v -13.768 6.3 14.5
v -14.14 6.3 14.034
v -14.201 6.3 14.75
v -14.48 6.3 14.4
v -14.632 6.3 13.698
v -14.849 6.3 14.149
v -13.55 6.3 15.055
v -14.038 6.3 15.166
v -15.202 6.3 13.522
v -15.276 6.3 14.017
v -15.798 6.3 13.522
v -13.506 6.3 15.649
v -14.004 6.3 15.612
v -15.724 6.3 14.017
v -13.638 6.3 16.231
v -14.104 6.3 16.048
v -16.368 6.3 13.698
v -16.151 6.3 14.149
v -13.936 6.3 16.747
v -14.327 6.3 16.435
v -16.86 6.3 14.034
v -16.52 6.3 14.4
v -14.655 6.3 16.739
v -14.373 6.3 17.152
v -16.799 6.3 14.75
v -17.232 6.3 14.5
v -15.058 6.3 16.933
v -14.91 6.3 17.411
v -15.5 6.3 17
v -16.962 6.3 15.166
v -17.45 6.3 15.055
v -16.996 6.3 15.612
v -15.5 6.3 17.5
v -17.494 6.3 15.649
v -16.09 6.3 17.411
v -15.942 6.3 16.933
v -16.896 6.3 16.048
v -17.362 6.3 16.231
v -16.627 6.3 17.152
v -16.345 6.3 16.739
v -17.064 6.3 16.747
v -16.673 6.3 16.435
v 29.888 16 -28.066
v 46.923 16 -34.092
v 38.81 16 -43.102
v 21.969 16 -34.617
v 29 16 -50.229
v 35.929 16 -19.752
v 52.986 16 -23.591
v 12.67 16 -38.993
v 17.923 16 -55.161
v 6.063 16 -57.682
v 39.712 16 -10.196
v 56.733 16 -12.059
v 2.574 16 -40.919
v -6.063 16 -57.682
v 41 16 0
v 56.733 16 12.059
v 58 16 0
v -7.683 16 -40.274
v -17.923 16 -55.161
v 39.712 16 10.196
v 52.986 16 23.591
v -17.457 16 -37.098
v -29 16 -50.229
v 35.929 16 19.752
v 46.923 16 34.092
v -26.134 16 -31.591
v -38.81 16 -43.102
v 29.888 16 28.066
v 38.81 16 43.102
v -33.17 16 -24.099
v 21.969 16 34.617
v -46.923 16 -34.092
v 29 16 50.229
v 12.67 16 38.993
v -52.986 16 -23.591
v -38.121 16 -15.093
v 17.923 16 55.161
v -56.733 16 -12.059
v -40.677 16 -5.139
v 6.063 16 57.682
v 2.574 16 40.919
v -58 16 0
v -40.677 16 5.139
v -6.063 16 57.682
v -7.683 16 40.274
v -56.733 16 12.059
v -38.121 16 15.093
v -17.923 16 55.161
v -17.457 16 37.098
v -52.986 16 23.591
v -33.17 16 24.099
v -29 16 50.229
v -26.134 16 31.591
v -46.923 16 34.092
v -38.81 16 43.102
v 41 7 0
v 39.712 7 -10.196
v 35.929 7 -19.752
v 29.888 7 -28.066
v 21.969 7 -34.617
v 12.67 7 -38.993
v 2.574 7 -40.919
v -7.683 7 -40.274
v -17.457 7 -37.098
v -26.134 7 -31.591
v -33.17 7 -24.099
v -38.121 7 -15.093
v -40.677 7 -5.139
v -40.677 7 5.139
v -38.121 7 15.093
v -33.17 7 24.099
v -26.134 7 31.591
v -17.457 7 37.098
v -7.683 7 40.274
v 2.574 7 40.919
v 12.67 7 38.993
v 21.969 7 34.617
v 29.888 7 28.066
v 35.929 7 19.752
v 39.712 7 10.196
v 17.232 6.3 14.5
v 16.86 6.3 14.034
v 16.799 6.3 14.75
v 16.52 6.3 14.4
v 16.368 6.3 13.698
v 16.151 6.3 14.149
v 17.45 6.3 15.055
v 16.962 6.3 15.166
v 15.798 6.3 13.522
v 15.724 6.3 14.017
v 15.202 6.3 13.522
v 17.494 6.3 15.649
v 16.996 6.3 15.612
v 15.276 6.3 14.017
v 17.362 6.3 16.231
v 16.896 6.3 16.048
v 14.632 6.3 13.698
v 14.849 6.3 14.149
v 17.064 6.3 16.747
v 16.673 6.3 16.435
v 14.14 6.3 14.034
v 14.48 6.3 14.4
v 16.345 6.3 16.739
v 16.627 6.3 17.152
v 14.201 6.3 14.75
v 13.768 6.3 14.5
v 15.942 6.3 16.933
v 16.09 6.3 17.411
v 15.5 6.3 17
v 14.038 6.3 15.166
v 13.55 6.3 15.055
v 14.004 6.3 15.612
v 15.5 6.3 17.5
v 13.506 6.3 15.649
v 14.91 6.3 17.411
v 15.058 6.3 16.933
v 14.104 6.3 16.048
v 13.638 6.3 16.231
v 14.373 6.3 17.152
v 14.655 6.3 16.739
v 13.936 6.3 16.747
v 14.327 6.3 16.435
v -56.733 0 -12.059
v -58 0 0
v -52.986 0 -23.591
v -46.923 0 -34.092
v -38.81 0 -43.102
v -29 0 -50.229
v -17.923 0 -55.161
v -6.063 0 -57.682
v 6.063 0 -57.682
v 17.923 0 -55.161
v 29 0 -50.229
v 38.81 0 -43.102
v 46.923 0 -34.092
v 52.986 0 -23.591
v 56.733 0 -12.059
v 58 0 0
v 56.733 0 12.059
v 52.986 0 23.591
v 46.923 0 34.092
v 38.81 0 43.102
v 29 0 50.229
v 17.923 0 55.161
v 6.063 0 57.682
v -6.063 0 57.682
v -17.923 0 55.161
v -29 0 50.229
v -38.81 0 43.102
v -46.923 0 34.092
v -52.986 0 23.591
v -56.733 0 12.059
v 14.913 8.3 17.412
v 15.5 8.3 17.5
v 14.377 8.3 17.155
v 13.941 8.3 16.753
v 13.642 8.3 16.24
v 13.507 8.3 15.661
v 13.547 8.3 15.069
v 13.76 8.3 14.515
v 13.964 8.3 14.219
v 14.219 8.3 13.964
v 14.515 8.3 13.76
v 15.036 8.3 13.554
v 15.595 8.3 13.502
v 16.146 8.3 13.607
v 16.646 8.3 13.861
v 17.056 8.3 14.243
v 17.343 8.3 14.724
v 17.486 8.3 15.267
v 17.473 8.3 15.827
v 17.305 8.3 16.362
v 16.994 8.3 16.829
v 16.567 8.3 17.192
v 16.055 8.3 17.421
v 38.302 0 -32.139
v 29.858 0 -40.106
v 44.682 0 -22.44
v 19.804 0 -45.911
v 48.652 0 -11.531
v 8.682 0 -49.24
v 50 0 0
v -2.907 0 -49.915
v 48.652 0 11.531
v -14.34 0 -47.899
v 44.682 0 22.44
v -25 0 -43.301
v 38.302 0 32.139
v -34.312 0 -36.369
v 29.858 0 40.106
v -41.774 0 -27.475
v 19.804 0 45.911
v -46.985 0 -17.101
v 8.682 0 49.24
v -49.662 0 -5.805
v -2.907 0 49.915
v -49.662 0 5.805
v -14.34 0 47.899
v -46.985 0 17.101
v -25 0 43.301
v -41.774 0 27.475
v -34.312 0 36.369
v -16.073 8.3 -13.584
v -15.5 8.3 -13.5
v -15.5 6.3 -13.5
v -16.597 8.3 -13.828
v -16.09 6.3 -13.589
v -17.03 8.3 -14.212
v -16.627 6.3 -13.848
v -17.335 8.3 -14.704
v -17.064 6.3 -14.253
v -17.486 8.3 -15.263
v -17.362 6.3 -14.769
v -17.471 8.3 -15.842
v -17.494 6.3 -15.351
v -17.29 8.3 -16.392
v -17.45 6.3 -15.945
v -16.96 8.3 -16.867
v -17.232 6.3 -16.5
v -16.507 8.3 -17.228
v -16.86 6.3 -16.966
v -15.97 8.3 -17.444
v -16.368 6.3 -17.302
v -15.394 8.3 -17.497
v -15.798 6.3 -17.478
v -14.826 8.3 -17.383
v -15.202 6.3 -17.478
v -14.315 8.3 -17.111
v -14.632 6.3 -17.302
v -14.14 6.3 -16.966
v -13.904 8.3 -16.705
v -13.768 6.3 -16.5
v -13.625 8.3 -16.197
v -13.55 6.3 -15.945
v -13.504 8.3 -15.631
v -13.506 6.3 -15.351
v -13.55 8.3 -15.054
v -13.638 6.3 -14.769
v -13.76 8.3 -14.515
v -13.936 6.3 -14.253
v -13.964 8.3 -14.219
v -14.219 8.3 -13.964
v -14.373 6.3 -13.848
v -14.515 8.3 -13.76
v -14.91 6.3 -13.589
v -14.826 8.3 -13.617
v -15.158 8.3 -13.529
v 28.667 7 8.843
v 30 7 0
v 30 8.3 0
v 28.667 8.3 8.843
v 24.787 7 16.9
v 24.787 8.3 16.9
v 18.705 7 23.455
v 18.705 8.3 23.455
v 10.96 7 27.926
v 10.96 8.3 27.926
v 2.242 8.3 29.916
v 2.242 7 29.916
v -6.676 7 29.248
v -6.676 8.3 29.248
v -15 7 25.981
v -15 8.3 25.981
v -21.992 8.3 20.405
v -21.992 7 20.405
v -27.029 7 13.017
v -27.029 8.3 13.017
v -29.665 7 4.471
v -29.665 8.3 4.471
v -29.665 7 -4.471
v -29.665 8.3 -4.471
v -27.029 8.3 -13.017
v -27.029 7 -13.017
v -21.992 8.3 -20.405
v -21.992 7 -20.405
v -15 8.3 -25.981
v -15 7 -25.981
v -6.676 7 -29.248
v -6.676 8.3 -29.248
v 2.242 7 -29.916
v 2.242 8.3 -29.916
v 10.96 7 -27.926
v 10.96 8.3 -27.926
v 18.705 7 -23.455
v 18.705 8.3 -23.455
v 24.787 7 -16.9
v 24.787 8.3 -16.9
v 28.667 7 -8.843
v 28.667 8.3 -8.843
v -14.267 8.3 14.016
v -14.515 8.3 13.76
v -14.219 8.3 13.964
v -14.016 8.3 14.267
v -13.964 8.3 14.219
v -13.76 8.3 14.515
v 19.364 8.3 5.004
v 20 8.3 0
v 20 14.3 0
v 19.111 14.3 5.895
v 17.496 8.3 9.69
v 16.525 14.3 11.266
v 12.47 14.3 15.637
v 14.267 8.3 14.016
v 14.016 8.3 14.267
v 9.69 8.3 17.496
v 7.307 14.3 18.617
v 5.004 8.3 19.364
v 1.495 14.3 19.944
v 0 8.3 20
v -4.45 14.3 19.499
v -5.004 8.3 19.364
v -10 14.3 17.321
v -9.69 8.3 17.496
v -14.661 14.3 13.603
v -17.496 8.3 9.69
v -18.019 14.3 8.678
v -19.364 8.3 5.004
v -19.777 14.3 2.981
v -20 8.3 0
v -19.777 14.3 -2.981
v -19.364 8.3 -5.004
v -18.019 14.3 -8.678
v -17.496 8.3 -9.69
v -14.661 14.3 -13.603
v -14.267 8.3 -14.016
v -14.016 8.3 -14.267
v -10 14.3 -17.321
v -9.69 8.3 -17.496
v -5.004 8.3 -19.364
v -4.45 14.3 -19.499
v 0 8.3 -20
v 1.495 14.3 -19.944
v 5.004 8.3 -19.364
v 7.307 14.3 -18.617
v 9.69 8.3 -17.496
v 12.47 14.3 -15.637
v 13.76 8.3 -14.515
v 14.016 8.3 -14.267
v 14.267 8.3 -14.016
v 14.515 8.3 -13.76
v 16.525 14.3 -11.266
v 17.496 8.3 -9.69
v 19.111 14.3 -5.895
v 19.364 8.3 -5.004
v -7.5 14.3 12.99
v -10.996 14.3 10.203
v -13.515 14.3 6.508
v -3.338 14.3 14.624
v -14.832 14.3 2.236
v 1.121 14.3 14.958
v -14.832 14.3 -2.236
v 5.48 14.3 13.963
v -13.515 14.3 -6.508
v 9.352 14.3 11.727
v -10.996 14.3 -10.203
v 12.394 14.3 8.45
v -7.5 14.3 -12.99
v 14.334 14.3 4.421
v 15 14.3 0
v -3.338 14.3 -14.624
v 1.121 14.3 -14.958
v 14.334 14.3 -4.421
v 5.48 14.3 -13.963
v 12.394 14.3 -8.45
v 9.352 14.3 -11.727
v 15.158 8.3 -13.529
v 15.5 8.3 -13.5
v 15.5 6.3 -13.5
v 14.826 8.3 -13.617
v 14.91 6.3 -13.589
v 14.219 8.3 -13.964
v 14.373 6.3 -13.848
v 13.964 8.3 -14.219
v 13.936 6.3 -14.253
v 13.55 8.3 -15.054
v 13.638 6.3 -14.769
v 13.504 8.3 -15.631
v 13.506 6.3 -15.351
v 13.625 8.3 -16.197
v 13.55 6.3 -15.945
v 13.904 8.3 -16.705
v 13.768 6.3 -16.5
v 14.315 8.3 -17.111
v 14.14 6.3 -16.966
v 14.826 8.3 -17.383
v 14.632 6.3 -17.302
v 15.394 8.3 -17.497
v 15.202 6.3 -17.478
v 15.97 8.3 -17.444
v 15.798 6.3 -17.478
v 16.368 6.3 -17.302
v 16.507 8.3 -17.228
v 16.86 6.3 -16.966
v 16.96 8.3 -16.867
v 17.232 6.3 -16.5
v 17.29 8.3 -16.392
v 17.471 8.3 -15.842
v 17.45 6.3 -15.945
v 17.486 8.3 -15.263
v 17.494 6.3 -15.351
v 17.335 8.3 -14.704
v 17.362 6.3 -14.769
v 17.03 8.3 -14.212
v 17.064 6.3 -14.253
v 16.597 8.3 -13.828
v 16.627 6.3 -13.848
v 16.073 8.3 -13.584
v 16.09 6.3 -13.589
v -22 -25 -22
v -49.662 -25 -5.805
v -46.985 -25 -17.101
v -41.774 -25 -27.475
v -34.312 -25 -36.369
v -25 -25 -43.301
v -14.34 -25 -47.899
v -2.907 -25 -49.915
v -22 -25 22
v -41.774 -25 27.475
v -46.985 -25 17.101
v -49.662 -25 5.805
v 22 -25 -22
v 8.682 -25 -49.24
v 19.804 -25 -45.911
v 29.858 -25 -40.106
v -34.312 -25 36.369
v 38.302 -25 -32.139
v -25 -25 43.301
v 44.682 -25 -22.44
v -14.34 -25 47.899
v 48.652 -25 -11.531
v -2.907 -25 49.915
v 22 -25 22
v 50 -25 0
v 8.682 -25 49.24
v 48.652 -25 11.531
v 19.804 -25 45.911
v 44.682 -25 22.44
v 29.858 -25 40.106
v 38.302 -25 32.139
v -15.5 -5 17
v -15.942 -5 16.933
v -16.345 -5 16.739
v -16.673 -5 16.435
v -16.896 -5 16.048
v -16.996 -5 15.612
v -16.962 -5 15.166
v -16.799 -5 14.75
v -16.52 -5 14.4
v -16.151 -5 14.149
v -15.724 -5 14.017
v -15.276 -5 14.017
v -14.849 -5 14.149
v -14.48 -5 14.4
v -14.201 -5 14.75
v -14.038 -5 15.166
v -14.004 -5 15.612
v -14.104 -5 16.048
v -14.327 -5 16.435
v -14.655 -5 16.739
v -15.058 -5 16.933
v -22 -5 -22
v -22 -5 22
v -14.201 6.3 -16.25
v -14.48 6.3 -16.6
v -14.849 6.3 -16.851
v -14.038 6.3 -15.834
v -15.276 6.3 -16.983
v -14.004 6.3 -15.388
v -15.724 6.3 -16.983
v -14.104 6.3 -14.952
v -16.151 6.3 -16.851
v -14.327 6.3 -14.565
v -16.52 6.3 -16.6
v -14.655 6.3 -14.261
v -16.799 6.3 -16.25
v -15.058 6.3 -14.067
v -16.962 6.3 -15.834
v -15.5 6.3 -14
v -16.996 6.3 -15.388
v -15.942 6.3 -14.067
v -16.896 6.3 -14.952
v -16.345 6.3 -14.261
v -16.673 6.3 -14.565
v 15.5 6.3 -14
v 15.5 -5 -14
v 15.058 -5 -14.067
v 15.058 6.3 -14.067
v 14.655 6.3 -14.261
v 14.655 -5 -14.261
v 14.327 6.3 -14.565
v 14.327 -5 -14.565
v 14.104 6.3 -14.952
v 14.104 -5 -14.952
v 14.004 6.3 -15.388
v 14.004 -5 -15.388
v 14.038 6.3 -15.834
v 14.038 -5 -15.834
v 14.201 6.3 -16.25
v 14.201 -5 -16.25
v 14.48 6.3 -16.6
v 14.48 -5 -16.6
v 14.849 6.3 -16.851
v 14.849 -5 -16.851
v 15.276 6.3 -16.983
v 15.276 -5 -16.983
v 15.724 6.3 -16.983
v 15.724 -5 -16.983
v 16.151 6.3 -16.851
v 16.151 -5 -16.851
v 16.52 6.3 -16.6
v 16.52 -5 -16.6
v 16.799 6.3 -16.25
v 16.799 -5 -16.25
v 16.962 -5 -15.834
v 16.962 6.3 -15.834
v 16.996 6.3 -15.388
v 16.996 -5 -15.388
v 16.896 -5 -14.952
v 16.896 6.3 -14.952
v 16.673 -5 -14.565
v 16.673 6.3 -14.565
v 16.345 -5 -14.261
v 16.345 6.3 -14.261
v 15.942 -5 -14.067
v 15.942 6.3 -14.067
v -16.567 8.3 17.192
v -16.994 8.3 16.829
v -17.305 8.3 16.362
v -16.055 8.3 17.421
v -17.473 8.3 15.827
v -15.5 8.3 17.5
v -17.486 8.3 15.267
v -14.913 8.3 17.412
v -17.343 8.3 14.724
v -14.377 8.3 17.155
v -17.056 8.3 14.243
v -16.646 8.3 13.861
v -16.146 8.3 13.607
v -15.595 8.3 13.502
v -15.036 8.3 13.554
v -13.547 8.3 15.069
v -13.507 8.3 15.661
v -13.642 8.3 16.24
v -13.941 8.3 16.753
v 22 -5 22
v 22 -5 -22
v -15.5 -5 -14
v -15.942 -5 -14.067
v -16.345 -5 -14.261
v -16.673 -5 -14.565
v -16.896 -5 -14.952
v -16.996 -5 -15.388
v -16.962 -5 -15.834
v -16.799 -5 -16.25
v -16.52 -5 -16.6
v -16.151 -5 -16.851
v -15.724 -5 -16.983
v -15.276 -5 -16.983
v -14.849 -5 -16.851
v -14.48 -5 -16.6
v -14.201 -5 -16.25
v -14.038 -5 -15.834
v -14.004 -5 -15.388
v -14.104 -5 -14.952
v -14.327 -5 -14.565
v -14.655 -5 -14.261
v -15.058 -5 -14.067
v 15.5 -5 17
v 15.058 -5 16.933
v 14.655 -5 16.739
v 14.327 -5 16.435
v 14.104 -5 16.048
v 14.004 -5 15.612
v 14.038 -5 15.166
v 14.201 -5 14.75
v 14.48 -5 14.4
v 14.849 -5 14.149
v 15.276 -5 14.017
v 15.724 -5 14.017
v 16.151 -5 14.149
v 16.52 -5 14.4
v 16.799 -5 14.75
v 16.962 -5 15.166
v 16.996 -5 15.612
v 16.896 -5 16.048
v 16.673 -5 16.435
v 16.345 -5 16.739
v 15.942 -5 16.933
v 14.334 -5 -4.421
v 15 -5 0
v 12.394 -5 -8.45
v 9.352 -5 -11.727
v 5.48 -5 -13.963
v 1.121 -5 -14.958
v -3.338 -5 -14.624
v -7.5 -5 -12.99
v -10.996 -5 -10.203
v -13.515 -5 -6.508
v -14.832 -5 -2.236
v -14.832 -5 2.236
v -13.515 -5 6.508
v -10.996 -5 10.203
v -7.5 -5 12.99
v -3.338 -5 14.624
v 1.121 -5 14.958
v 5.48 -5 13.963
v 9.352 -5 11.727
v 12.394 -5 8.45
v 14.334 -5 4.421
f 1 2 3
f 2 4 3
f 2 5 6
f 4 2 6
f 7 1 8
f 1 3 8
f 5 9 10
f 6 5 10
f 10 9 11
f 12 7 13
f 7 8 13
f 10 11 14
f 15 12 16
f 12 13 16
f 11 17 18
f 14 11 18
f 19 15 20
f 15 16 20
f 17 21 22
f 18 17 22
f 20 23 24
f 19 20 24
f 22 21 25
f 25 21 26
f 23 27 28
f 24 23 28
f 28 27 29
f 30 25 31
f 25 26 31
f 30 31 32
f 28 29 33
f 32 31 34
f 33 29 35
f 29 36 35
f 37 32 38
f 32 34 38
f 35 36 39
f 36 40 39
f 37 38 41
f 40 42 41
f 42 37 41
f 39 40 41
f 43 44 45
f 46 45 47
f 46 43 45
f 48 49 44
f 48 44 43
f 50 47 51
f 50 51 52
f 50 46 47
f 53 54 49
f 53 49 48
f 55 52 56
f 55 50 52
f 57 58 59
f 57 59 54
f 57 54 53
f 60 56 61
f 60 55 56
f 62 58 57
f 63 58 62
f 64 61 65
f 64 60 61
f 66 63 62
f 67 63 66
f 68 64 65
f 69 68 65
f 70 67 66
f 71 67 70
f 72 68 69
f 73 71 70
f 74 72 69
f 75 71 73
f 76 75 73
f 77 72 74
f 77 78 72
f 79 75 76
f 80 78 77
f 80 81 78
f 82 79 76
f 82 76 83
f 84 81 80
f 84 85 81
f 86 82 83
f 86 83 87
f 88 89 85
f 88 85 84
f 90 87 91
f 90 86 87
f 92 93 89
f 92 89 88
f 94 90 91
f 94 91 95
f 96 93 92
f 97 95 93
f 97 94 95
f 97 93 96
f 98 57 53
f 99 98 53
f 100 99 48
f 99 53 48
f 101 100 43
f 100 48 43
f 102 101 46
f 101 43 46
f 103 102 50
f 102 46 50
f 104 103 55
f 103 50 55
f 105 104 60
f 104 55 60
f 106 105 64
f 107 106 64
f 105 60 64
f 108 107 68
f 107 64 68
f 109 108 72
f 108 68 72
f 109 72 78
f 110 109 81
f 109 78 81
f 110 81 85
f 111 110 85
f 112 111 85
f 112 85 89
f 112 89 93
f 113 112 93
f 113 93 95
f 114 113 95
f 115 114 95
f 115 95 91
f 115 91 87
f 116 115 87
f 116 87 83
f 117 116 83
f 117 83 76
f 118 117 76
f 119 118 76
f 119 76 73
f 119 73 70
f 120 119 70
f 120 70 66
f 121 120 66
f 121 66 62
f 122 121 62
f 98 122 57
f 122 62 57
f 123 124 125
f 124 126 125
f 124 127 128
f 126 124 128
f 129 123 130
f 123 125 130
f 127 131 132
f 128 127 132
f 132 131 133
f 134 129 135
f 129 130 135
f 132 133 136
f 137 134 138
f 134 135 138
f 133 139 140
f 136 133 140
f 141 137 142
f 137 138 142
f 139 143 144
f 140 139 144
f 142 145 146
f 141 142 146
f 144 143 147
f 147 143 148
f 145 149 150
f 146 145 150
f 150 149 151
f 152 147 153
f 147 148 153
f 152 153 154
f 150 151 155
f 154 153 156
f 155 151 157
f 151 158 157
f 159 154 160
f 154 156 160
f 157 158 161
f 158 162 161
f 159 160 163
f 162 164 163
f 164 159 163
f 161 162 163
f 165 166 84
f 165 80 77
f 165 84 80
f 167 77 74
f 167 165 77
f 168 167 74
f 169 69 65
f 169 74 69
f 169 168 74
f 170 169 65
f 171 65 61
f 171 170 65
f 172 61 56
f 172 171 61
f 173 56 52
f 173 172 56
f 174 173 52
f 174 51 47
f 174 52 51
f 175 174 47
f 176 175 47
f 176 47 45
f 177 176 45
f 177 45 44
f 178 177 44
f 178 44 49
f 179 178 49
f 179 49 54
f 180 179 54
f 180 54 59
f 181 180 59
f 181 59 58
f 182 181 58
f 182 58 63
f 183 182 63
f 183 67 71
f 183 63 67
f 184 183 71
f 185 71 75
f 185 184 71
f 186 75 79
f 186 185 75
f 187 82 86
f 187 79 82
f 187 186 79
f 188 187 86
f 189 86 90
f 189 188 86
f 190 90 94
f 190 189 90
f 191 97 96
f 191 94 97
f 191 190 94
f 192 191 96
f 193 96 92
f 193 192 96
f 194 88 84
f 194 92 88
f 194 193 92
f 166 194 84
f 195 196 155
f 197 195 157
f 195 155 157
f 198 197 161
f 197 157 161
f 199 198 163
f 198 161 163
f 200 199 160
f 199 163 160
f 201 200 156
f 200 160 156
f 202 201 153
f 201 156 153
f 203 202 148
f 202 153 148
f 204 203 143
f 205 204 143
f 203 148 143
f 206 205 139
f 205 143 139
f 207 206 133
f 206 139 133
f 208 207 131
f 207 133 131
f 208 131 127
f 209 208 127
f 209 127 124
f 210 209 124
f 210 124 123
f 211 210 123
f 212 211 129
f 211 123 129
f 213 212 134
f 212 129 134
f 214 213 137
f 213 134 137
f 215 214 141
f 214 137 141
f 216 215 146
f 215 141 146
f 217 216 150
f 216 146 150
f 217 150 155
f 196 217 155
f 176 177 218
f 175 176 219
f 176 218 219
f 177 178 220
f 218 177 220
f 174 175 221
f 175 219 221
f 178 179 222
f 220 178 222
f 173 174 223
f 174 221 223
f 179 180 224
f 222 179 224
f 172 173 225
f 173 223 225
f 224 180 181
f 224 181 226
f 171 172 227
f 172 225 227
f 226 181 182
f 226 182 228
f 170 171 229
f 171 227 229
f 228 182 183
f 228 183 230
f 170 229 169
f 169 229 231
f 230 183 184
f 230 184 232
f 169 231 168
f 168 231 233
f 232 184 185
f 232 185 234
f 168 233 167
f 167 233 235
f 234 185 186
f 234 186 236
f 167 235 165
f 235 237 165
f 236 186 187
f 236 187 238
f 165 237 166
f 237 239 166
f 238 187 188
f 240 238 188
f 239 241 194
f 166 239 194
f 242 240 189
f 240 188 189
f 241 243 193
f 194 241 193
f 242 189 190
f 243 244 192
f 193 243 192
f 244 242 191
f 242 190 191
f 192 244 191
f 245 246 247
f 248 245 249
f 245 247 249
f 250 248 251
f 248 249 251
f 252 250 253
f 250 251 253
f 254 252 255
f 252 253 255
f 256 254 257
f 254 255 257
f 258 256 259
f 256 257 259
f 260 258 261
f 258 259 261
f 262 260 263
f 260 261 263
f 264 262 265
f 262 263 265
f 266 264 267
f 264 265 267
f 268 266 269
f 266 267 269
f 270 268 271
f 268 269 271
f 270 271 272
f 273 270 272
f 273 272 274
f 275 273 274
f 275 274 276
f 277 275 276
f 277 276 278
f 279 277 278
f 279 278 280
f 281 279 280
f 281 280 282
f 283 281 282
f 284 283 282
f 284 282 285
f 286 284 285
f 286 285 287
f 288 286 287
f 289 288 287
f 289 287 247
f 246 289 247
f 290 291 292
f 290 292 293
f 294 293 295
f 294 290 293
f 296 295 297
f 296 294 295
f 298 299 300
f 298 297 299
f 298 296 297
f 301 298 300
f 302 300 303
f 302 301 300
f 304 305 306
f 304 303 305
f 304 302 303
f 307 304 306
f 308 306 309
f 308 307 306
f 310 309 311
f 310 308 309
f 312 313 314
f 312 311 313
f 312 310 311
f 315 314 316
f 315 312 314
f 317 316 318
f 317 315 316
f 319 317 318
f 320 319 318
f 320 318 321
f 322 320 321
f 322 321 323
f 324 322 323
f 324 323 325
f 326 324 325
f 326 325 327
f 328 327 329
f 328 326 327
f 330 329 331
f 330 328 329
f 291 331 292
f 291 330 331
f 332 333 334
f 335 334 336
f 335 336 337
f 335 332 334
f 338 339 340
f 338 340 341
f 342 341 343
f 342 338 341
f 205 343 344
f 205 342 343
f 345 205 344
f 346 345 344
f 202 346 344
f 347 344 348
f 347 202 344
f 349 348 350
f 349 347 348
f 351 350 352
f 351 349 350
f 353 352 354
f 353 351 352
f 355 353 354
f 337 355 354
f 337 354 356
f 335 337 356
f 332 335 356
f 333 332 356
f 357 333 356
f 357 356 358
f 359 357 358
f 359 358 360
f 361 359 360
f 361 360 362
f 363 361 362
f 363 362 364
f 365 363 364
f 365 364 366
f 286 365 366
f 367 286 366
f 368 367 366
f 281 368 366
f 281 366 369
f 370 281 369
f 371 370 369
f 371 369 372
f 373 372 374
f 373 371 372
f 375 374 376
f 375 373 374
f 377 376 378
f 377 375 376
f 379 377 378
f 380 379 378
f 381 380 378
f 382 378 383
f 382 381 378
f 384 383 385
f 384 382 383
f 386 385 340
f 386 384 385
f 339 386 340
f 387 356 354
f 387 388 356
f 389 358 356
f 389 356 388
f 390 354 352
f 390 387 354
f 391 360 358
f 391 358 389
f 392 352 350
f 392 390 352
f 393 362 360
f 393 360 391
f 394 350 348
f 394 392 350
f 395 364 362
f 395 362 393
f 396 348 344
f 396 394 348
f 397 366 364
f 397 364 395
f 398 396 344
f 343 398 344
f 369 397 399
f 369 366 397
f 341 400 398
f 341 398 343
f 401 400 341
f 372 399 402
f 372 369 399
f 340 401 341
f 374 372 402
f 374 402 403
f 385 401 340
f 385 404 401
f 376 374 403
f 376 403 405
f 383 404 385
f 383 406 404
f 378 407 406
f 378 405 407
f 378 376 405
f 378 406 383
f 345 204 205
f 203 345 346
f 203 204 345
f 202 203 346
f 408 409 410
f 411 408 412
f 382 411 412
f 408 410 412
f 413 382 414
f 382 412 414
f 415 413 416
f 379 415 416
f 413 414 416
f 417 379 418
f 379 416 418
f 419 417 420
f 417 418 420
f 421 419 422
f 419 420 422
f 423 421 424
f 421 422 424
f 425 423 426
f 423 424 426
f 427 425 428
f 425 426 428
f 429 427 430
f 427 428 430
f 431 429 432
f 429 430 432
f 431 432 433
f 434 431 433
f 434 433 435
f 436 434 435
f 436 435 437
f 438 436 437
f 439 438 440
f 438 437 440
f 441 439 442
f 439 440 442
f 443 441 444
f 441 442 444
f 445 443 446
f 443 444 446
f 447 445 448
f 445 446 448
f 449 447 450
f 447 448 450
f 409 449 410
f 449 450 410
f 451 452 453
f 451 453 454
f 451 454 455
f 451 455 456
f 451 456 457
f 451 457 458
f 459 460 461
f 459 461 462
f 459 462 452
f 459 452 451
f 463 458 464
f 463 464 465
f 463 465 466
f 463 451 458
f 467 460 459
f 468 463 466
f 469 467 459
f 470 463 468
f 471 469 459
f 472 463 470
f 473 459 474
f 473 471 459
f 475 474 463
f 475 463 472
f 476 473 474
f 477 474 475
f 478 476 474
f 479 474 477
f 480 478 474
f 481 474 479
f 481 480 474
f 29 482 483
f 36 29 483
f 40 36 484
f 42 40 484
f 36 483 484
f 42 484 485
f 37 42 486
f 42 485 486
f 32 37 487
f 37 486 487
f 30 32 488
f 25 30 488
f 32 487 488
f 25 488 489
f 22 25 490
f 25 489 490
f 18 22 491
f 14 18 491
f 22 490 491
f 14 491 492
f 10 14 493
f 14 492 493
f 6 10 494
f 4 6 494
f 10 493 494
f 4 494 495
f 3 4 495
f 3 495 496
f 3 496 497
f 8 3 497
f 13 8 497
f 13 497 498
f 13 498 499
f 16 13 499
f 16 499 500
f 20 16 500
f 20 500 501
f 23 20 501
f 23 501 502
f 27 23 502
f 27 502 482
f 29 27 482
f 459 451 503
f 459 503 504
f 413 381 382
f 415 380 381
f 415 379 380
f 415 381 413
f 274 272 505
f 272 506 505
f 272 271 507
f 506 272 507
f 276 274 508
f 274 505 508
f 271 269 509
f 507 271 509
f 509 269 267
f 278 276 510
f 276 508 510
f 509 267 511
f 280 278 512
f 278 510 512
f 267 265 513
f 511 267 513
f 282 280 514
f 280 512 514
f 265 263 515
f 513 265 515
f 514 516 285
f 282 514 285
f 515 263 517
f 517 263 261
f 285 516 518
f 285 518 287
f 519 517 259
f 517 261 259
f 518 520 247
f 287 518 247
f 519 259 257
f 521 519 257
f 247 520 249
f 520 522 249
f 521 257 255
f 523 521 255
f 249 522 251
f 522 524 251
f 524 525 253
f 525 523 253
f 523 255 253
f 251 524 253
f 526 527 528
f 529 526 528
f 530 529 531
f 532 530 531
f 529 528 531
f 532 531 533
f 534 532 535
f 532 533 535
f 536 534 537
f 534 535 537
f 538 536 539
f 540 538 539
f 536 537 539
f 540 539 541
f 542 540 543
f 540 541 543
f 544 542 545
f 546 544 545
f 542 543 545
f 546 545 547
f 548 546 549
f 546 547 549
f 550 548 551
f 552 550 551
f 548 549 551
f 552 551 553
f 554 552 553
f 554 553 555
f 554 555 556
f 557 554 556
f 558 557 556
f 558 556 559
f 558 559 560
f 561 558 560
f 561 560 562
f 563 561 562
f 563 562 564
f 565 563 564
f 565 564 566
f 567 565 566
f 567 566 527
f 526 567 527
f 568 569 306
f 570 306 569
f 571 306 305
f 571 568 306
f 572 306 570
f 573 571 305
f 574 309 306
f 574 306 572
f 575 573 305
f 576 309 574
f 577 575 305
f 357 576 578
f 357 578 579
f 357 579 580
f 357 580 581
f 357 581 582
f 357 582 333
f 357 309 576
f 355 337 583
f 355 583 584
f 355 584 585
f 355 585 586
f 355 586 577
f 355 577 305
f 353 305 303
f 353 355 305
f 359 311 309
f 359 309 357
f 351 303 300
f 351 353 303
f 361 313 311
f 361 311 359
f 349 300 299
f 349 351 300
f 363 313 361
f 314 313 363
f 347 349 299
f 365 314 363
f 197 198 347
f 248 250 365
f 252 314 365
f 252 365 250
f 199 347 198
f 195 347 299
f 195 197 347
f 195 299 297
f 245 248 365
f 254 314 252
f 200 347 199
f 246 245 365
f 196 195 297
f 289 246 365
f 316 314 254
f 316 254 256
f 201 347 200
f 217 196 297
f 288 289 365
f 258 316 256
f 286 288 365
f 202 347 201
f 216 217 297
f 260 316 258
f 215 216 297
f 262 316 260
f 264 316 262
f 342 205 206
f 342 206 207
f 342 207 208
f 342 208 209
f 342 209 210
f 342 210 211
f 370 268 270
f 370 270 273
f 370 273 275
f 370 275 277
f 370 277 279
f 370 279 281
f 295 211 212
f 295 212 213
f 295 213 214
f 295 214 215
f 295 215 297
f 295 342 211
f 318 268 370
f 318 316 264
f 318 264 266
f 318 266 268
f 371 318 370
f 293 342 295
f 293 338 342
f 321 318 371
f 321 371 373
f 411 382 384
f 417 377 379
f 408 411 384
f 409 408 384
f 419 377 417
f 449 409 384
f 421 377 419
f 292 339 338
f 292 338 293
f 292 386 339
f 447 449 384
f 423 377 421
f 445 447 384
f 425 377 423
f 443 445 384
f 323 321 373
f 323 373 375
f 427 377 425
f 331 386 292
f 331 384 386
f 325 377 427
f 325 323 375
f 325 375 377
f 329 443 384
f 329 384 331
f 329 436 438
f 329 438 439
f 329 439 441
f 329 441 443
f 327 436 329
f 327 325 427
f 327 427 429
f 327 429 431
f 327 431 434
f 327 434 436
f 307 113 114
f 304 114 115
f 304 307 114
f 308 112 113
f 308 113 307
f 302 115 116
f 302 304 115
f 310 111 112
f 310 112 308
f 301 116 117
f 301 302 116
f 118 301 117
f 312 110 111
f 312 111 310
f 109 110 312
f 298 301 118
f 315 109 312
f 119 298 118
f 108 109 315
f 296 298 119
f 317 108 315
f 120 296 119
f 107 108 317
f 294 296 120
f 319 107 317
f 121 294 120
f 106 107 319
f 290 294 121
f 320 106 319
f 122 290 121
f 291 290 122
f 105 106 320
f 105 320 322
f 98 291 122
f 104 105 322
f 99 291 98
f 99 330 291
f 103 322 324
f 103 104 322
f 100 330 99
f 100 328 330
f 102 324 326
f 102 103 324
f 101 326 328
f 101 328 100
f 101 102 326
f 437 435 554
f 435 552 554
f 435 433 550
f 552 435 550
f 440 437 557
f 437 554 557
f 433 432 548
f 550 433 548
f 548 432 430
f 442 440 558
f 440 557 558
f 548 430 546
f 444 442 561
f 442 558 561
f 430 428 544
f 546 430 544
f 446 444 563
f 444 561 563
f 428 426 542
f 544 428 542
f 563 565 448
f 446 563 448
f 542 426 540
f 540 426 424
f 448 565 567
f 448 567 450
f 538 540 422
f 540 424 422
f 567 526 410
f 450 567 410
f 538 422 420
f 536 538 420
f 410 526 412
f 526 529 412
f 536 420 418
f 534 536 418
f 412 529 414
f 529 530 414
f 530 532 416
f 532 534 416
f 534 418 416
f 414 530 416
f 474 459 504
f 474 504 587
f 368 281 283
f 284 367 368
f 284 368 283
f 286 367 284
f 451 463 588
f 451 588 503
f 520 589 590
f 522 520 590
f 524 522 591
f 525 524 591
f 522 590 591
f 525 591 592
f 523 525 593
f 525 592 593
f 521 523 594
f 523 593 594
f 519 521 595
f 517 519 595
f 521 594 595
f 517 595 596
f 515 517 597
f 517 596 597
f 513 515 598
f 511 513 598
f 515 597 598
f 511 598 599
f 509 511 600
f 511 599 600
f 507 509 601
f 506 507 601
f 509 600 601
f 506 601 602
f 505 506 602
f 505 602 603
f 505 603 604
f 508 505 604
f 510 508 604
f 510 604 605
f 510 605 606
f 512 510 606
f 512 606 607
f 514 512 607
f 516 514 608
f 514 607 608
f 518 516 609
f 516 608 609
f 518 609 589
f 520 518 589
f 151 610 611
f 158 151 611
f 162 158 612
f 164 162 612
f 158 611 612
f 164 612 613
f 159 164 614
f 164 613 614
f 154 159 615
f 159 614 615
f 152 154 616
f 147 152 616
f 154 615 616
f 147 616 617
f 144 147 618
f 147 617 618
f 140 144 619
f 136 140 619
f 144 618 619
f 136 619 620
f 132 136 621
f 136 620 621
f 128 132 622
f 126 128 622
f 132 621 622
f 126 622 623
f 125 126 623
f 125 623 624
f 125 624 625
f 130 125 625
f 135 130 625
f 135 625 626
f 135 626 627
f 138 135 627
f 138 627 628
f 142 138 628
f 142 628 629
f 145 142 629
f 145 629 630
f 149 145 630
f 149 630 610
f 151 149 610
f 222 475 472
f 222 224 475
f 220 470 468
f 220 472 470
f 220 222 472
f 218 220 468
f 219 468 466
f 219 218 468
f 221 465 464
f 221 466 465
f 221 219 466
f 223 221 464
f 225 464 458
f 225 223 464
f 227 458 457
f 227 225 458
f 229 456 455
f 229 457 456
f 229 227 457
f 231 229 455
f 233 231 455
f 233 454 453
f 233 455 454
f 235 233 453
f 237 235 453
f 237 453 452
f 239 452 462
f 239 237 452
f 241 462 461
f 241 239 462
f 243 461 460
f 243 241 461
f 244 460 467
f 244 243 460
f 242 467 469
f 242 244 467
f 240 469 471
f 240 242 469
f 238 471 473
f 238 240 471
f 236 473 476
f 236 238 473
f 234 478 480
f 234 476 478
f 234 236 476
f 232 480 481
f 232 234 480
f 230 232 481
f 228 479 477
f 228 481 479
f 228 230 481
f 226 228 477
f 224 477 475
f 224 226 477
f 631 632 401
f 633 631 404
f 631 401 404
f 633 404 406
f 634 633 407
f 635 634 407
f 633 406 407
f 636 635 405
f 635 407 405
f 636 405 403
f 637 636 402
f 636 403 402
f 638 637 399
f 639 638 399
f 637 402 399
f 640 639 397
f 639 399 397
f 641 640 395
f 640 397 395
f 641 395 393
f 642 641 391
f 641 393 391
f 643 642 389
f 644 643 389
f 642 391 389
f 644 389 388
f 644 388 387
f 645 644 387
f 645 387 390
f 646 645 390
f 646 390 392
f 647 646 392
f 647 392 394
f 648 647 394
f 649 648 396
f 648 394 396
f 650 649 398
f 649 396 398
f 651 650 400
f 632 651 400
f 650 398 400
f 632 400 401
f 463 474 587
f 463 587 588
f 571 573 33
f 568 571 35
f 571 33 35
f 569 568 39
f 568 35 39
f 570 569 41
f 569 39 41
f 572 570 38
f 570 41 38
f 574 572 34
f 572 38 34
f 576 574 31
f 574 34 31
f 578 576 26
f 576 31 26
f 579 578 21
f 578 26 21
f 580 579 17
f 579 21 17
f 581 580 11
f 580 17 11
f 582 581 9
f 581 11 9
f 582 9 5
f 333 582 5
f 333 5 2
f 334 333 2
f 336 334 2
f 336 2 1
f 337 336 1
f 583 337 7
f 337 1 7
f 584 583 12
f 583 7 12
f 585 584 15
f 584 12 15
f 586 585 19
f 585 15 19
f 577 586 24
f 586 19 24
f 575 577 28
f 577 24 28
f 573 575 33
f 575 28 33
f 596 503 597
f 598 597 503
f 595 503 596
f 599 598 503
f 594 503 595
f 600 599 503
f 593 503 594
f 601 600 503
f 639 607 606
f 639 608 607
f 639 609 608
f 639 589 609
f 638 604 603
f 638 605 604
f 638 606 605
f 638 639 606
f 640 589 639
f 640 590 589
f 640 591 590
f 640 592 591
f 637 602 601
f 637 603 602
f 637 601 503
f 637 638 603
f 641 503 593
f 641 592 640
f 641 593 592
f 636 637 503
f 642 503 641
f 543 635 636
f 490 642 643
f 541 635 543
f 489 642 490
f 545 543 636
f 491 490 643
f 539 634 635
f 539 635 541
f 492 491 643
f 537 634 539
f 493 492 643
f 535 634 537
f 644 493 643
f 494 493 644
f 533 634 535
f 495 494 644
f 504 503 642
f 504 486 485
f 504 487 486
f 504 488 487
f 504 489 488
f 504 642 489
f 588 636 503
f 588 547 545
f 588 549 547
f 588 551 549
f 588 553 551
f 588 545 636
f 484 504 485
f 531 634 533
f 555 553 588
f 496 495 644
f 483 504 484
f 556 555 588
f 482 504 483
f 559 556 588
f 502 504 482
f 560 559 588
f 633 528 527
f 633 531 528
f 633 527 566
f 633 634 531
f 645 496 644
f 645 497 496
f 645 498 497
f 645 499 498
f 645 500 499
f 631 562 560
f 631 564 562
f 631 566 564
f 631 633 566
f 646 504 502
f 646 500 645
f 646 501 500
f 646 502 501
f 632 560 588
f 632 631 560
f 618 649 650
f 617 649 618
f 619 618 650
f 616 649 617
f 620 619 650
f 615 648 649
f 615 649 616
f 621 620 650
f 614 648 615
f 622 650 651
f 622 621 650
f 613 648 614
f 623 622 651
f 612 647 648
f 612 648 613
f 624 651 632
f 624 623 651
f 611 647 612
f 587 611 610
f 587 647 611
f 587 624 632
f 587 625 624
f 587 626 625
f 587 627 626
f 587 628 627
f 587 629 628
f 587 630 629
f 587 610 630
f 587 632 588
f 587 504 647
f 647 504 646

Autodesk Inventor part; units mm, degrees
ref_plane "YZ Plane" through (0, 0, 0) normal (1, 0, 0) x (0, 1, 0)
ref_plane "XZ Plane" through (0, 0, 0) normal (0, 1, 0) x (-1, 0, 0)
ref_plane "XY Plane" through (0, 0, 0) normal (0, 0, 1) x (1, 0, 0)
sketch "Sketch1" plane through (0, 0, 0) normal (0, 1, 0) x (-1, 0, 0)
  circle A0 centre (0, 0) radius 58
  dimension "d0" = 116
extrude "Extrusion1" add sketch "Sketch1" along normal blind 16
sketch "Sketch2" plane through (0, 16, 0) normal (0, 1, 0) x (1, 0, 0)
  circle A0 centre (0, 0) radius 41
  dimension "d3" = 82
extrude "Extrusion2" cut sketch "Sketch2" against normal blind 9
sketch "Sketch3" plane through (0, 0, 0) normal (0, -1, 0) x (1, 0, 0)
  circle A0 centre (0, 0) radius 50
  dimension "d6" = 100
extrude "Extrusion3" add sketch "Sketch3" along normal blind 25
sketch "Sketch4" plane through (0, 7, 0) normal (0, 1, 0) x (1, 0, 0)
  circle A0 centre (0, 0) radius 30
  dimension "d9" = 60
extrude "Extrusion4" add sketch "Sketch4" along normal blind 1.3
sketch "Sketch6" plane through (0, 8.3, 0) normal (0, 1, 0) x (1, 0, 0)
  circle A0 centre (0, 0) radius 20
  dimension "d12" = 40
extrude "Extrusion5" add sketch "Sketch6" along normal blind 6
sketch "Sketch7" plane through (0, 14.3, 0) normal (0, 1, 0) x (1, 0, 0)
  circle A0 centre (0, 0) radius 15
  dimension "d15" = 30
extrude "Extrusion6" cut sketch "Sketch7" against normal blind 50
sketch "Sketch8" plane through (0, -25, 0) normal (0, -1, 0) x (1, 0, 0)
  line L0 (-22, 22) -> (22, 22)
  line L1 (22, 22) -> (22, -22)
  line L2 (22, -22) -> (-22, -22)
  line L3 (-22, -22) -> (-22, 22)
  circle A0 centre (0, 0) radius 20 projected
  point P0 (-15.5, 15.5)
  point P1 (15.5, 15.5)
  point P2 (15.5, -15.5)
  point P3 (-15.5, -15.3905)
  dimension "d34" = 22
  dimension "d35" = 22
  dimension "d36" = 22
  dimension "d37" = 22
extrude "Extrusion7" cut sketch "Sketch8" against normal blind 20 contours L0 L1 L2 L3 | A0
sketch "Sketch12" plane through (0, 8.3, 0) normal (0, 1, 0) x (1, 0, 0)
  point P0 (0, 0)
  point P1 (-15.5, 15.5)
  point P2 (15.5, 15.5)
  point P3 (15.5, -15.5)
  point P4 (-15.5, -15.5)
  dimension "d72" = 31
  dimension "d73" = 31
  dimension "d74" = 31
  dimension "d75" = 31
  dimension "d76" = 15.5
  dimension "d77" = 15.5
  dimension "d85" = 15.5
hole "Hole5" at (-15.5, 8.3, -15.5) at (15.5, 8.3, -15.5) at (15.5, 8.3, 15.5) at (-15.5, 8.3, 15.5) direction (0, -1, 0) diameter 3 end through all counterbore diameter 4 counterbore depth 2
